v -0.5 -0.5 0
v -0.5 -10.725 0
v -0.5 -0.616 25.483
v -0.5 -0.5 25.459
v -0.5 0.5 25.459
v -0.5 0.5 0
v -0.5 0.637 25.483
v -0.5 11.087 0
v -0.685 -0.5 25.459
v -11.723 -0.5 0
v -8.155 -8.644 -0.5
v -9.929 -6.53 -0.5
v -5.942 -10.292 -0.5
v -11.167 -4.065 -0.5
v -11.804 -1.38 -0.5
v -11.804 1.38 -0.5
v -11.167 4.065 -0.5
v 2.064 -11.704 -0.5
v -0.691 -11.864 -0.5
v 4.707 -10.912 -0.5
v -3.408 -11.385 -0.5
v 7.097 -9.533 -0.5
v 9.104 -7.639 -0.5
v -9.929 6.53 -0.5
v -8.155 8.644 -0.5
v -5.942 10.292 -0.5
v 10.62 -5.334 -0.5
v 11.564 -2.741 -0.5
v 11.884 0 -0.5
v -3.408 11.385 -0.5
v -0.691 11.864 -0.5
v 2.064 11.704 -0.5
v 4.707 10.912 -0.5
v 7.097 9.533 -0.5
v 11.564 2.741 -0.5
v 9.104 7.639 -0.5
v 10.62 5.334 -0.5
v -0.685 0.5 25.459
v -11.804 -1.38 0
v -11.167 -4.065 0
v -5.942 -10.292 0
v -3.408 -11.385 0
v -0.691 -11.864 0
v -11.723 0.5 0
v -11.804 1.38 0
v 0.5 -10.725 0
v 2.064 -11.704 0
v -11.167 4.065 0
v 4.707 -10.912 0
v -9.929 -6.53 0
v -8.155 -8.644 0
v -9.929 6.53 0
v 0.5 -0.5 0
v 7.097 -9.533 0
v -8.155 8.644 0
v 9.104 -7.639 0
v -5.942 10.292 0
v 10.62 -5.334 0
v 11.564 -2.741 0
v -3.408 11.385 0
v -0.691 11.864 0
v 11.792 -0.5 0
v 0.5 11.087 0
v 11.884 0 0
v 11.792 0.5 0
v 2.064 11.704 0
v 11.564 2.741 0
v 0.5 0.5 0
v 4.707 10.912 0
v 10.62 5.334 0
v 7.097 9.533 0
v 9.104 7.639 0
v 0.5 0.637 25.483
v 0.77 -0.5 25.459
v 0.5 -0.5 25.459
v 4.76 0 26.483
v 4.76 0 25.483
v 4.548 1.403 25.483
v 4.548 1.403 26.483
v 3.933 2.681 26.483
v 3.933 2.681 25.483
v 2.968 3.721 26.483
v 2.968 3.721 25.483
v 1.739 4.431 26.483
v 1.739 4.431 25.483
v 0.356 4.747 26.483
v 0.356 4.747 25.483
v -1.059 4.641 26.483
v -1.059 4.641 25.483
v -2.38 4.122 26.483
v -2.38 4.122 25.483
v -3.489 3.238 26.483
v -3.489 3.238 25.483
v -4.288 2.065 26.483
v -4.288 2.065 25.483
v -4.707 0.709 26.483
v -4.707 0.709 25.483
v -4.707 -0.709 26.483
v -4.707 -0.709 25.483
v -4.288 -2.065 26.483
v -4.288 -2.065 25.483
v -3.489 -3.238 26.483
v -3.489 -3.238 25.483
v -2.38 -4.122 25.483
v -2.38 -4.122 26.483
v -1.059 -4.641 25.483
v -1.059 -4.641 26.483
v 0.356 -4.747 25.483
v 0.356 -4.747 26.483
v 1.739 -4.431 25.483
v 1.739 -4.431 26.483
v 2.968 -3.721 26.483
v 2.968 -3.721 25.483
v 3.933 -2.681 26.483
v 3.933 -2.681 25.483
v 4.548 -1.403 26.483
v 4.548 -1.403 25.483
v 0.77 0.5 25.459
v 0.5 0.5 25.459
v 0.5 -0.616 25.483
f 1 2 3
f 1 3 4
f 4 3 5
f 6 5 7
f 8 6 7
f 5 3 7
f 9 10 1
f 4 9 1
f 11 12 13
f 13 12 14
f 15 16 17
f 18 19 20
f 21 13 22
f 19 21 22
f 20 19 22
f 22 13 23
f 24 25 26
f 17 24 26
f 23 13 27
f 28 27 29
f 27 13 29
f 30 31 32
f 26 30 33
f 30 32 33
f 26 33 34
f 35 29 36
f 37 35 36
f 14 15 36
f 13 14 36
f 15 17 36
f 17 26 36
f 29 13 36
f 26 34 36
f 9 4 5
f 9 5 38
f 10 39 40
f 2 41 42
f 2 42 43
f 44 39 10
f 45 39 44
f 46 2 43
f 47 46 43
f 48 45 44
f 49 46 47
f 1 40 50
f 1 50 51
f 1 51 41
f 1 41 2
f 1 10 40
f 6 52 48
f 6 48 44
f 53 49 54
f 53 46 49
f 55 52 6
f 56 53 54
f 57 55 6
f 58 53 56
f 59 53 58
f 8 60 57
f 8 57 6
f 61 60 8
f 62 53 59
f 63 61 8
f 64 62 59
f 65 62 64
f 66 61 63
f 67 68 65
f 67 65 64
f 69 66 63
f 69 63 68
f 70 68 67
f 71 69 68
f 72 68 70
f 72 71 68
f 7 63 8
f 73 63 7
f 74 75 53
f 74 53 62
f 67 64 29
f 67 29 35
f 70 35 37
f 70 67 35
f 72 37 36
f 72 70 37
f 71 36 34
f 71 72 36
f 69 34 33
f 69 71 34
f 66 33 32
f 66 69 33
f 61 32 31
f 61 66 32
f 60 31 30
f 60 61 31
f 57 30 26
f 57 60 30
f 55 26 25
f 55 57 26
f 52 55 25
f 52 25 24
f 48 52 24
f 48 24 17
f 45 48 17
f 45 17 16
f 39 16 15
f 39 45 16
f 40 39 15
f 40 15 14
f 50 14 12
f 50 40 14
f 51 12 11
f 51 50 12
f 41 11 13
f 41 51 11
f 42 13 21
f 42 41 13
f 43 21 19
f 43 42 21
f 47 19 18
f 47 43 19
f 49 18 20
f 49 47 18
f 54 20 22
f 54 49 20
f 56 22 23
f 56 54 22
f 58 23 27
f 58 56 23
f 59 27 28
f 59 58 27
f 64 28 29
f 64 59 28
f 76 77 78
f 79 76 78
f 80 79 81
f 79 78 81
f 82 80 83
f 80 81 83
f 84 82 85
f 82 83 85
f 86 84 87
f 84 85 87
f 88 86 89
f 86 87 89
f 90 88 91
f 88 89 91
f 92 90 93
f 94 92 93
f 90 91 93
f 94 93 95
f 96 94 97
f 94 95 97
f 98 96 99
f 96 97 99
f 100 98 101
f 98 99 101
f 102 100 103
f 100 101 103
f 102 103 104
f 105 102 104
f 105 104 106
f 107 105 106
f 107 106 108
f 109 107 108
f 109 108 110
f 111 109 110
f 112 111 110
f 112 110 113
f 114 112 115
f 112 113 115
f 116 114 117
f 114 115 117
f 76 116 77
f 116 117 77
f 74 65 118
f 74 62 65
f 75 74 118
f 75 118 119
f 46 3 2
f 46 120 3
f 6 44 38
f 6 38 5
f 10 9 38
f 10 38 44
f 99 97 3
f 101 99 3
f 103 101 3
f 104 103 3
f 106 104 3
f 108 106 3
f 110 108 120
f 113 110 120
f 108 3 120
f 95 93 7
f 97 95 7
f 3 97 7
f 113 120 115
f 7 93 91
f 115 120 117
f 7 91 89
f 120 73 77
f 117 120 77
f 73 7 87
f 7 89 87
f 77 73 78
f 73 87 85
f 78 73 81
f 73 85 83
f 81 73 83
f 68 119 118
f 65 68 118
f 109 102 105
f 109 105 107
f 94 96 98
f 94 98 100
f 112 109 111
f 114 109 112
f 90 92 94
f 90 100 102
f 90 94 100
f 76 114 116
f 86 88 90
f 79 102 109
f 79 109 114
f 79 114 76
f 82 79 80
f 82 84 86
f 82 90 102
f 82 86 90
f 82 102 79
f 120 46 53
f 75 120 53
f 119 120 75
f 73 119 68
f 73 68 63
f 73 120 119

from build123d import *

# Parameters (mm, degrees)
F3_DEPTH = 0.5
F4_DEPTH = 0.5
F2_R     = 11.884128
F5_DEPTH = 0.5
F6_R     = 4.759852
F7_DEPTH = 1


with BuildPart() as f3:
    # F0 (on Front) → F3 (new body, symmetric)
    with BuildSketch(Plane.XZ):
        Polygon((0.76961, 25.458554), (-0.685163, 25.458554), (-11.722775, 0), (11.791914, 0), align=None)
    extrude(amount=F3_DEPTH, both=True)

    # F1 (on Right) → F4 (join, symmetric)
    with BuildSketch(Plane.YZ):
        Polygon((0, 25.482798), (-0.616243, 25.482798), (-10.725138, 0), (0, 0), (11.086991, 0), (0.637034, 25.482798), align=None)
    extrude(amount=F4_DEPTH, both=True)

    # F2 (on Top) → F5 (join)
    with BuildSketch(Plane.XY):
        Circle(F2_R)
    extrude(amount=-F5_DEPTH)

    # F6 (on face) → F7 (join)
    with BuildSketch(Plane.XY.offset(25.482798)):
        Circle(F6_R)
    extrude(amount=F7_DEPTH)


solid = f3.part
